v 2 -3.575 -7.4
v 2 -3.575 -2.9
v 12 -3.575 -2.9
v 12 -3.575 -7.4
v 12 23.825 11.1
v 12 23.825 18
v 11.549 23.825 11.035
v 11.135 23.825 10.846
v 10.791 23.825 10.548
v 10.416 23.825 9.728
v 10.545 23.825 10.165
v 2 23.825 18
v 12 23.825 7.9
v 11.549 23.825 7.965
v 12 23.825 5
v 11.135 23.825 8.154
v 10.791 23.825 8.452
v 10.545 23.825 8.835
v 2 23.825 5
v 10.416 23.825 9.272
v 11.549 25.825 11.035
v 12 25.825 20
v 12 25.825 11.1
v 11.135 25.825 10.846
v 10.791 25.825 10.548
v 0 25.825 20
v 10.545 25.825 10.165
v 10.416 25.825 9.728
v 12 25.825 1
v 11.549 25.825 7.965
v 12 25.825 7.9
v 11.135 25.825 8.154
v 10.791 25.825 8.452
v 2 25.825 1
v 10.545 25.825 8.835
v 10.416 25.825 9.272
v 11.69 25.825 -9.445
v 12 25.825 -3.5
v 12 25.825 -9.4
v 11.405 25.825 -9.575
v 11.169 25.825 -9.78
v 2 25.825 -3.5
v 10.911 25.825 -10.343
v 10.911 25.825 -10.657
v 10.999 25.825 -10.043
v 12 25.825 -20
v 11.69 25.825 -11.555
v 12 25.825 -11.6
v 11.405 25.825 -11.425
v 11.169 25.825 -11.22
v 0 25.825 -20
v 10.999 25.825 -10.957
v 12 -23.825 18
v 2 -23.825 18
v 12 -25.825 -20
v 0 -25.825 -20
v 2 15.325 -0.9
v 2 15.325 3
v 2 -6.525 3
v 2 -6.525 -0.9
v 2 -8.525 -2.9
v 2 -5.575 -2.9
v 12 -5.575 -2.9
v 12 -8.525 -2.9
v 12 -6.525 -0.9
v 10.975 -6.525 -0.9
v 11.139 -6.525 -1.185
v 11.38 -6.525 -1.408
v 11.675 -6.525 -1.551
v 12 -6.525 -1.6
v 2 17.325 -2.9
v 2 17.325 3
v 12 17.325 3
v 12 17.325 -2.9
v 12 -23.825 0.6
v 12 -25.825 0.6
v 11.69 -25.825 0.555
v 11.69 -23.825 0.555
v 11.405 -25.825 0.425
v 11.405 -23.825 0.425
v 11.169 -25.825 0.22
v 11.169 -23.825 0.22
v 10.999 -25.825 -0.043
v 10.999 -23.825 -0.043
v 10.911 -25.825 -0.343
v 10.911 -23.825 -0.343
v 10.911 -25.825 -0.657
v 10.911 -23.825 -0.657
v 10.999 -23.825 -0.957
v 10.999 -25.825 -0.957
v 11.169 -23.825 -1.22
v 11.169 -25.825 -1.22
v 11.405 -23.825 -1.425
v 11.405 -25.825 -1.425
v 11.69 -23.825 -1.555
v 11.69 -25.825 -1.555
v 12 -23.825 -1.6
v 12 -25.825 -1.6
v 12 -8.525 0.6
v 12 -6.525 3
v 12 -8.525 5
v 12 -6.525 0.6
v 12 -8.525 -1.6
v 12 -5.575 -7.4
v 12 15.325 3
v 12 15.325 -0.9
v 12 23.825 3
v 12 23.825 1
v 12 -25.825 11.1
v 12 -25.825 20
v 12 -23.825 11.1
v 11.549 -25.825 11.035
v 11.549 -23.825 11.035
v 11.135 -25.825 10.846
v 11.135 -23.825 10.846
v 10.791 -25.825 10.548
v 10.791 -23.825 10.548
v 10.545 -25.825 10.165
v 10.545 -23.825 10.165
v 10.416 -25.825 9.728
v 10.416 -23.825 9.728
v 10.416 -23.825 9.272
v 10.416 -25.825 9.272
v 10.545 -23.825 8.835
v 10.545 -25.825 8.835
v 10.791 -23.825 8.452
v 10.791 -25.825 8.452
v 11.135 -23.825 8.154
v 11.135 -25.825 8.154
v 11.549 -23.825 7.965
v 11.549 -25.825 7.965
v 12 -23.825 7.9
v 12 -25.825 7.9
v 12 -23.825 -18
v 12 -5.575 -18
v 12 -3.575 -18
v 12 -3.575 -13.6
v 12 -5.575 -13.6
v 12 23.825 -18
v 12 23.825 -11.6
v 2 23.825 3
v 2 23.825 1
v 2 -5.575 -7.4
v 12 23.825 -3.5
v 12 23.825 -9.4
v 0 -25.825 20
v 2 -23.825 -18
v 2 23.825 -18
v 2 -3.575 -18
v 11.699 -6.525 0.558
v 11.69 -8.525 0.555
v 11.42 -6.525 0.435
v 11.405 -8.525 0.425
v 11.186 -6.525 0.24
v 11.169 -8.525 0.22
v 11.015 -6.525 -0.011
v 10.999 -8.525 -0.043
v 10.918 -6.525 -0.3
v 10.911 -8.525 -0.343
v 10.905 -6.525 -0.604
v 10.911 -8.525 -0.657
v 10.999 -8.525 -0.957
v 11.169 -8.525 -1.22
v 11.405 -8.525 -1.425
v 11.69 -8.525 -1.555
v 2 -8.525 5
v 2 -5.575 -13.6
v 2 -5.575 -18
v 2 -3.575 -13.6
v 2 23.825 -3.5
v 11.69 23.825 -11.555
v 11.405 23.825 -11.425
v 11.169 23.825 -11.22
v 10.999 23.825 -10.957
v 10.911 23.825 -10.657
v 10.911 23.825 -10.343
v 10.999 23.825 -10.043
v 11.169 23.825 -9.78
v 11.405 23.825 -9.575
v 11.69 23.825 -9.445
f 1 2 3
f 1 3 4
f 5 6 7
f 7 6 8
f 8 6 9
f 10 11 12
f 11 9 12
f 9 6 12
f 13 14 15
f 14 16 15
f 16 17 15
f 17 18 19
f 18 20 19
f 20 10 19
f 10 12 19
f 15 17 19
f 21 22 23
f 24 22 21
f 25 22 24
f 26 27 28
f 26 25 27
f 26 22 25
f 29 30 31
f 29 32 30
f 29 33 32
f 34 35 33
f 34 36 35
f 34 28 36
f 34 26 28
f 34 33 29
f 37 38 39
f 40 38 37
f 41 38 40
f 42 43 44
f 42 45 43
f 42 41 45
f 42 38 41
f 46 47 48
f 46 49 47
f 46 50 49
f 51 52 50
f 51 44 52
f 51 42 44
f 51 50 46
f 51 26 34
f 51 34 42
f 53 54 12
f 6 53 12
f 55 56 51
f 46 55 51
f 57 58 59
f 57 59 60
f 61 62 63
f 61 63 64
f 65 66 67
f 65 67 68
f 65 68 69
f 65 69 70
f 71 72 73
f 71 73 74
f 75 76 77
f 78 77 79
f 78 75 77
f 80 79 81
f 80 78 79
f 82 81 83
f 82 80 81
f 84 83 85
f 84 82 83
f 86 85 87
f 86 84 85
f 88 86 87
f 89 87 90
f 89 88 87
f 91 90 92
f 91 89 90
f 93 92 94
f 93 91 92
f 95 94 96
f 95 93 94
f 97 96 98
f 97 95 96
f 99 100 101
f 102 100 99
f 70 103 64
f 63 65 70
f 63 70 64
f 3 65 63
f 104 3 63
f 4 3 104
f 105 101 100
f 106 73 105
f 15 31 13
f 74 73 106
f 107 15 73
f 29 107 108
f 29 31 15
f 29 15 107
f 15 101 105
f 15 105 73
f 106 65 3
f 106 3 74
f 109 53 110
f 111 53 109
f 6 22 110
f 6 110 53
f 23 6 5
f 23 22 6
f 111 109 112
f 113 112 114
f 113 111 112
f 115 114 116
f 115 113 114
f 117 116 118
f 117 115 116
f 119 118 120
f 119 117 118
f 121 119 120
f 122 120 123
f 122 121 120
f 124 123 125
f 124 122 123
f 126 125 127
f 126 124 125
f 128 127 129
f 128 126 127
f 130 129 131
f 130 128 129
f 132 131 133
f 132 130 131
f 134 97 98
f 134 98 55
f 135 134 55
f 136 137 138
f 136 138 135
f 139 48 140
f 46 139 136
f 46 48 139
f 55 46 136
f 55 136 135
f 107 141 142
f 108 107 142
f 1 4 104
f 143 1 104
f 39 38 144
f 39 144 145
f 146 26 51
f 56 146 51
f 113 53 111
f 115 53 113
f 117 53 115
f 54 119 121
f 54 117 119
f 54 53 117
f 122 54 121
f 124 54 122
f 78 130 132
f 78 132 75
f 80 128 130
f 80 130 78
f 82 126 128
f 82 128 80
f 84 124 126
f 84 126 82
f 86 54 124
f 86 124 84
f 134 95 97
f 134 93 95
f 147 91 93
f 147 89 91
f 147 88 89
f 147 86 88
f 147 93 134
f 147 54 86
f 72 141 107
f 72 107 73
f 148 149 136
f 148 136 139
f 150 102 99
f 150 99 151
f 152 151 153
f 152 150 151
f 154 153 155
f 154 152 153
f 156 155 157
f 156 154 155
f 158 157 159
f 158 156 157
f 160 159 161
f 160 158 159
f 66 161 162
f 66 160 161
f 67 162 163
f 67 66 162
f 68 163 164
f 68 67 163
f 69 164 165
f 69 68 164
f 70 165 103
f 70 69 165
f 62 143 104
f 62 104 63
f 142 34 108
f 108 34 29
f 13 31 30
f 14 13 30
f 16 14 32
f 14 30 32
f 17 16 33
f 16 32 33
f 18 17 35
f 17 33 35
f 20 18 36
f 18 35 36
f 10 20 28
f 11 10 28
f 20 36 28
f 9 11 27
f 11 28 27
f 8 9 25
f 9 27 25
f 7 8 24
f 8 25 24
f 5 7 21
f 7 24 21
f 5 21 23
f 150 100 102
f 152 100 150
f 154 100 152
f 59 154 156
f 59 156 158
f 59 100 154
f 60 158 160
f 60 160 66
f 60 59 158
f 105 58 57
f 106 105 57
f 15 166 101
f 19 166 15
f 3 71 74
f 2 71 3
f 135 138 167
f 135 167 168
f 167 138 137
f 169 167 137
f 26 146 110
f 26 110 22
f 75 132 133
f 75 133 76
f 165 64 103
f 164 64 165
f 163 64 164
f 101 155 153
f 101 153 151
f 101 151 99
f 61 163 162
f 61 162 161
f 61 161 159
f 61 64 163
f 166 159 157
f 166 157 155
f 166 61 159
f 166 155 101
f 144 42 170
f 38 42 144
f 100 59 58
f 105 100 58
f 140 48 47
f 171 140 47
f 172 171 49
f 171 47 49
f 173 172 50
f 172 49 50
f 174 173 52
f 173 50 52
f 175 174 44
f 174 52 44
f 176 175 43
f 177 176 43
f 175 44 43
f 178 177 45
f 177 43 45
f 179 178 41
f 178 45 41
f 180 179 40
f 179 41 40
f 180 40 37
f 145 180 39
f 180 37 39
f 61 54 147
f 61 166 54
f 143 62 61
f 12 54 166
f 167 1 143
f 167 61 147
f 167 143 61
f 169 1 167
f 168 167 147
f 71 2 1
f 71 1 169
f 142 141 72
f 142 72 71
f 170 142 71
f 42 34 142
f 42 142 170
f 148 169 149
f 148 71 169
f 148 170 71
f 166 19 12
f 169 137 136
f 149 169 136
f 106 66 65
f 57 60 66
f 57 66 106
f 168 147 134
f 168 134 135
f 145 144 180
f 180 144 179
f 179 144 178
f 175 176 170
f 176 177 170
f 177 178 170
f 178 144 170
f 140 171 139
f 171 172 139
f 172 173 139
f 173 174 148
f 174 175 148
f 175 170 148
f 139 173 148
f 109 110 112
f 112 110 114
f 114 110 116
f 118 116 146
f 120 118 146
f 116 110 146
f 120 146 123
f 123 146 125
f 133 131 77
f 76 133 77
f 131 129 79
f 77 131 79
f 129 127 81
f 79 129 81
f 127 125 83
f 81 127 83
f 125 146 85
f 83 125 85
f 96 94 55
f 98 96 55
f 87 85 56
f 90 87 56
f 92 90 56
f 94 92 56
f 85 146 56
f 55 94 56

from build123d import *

# Parameters (mm, degrees)
SKETCH_1_W                      = 40
SKETCH_1_H                      = 51.65
EXTRUDE_1_DEPTH                 = 12
SHELL_1_T                       = -2
SKETCH_3_W                      = 3.9
SKETCH_3_H                      = 21.85
SKETCH_3_W_2                    = 4.4
SKETCH_3_H_2                    = 2
EXTRUDE_6_DEPTH                 = 10
CUT_EXTRUDE_1_REACH             = 58.672
SKETCH_4_R                      = 1.1
SKETCH_4_R_2                    = 1.6
SKETCH_4_W                      = 10
SKETCH_4_H                      = 4.5
CUT_EXTRUDE_1_DIRECTION_2_DEPTH = 57.672061018
CUT_EXTRUDE_START               = -19.3
SKETCH_6_R                      = 1.1
SKETCH_6_R_2                    = 1.6
CUT_EXTRUDE_4_DEPTH             = 19.3


with BuildPart() as part:
    # 草图1 → 凸台-拉伸1 (new body)
    with BuildSketch(Plane(origin=(0, 0, 0), x_dir=(0, 0, -1), z_dir=(1, 0, 0))):
        Rectangle(SKETCH_1_W, SKETCH_1_H)
    extrude(amount=EXTRUDE_1_DEPTH)

    # 抽壳1
    shell_1_openings = [part.faces().sort_by_distance(p)[0] for p in [
        (12, 0, 0),
    ]]
    offset(amount=SHELL_1_T, openings=shell_1_openings, kind=Kind.INTERSECTION)

    # 草图3 → 凸台-拉伸6 (add)
    # profile 1 of 2: a face of its own
    with BuildSketch(Plane(origin=(2, 0, 0), x_dir=(0, 0, -1), z_dir=(1, 0, 0))):
        Polygon((2.9, -8.525), (-5, -8.525), (-5, 23.825), (-3, 23.825), (-3, 17.325), (2.9, 17.325), (2.9, -3.575), (7.4, -3.575), (7.4, -5.575), (2.9, -5.575), align=None)
        with Locations((-1.05, 4.4)):
            Rectangle(SKETCH_3_W, SKETCH_3_H, mode=Mode.SUBTRACT)
    # profile 2 of 2: a face of its own
    with BuildSketch(Plane(origin=(2, 0, 0), x_dir=(0, 0, -1), z_dir=(1, 0, 0))):
        with Locations((15.8, -4.575)):
            Rectangle(SKETCH_3_W_2, SKETCH_3_H_2)
    extrude(amount=EXTRUDE_6_DEPTH)

    # 草图4 → 切除-拉伸1 (cut, up to next)
    with BuildSketch(Plane(origin=(0, 25.825, 0), x_dir=(1, 0, 0), z_dir=(0, 1, 0)), mode=Mode.PRIVATE) as cut_extrude_1_sk1:
        with Locations((12, 10.5)):
            Circle(SKETCH_4_R)
    cut_extrude_1_tool1 = extrude(cut_extrude_1_sk1.sketch, amount=-CUT_EXTRUDE_1_REACH, mode=Mode.PRIVATE) & part.part
    # 草图4 → 切除-拉伸1 (cut, up to next)
    with BuildSketch(Plane(origin=(0, 25.825, 0), x_dir=(1, 0, 0), z_dir=(0, 1, 0)), mode=Mode.PRIVATE) as cut_extrude_1_sk2:
        with Locations((12, -9.5)):
            Circle(SKETCH_4_R_2)
    cut_extrude_1_tool2 = extrude(cut_extrude_1_sk2.sketch, amount=-CUT_EXTRUDE_1_REACH, mode=Mode.PRIVATE) & part.part
    # 草图4 → 切除-拉伸1 (cut, up to next)
    with BuildSketch(Plane(origin=(0, 25.825, 0), x_dir=(1, 0, 0), z_dir=(0, 1, 0)), mode=Mode.PRIVATE) as cut_extrude_1_sk3:
        with Locations((7, 1.25)):
            Rectangle(SKETCH_4_W, SKETCH_4_H)
    cut_extrude_1_tool3 = extrude(cut_extrude_1_sk3.sketch, amount=-CUT_EXTRUDE_1_REACH, mode=Mode.PRIVATE) & part.part
    add(cut_extrude_1_tool1.solids().sort_by_distance((12, 25.825, -10.5))[0], mode=Mode.SUBTRACT)
    add(cut_extrude_1_tool2.solids().sort_by_distance((12, 25.825, 9.5))[0], mode=Mode.SUBTRACT)
    add(cut_extrude_1_tool3.solids().sort_by_distance((7, 25.825, -1.25))[0], mode=Mode.SUBTRACT)

    # 草图4 → 切除-拉伸1 direction 2 (cut)
    with BuildSketch(Plane(origin=(0, 25.825, 0), x_dir=(1, 0, 0), z_dir=(0, 1, 0))):
        with Locations((12, 10.5)):
            Circle(SKETCH_4_R)
        with Locations((12, -9.5)):
            Circle(SKETCH_4_R_2)
        with Locations((7, 1.25)):
            Rectangle(SKETCH_4_W, SKETCH_4_H)
    extrude(amount=CUT_EXTRUDE_1_DIRECTION_2_DEPTH, mode=Mode.SUBTRACT)

    # 草图6 → 切除-拉伸4 (cut)
    with BuildSketch(Plane.XZ.offset(25.825).offset(CUT_EXTRUDE_START)):
        with Locations((12, -0.5)):
            Circle(SKETCH_6_R)
        with Locations((12, 9.5)):
            Circle(SKETCH_6_R_2)
    extrude(amount=CUT_EXTRUDE_4_DEPTH, mode=Mode.SUBTRACT)


solid = part.part
